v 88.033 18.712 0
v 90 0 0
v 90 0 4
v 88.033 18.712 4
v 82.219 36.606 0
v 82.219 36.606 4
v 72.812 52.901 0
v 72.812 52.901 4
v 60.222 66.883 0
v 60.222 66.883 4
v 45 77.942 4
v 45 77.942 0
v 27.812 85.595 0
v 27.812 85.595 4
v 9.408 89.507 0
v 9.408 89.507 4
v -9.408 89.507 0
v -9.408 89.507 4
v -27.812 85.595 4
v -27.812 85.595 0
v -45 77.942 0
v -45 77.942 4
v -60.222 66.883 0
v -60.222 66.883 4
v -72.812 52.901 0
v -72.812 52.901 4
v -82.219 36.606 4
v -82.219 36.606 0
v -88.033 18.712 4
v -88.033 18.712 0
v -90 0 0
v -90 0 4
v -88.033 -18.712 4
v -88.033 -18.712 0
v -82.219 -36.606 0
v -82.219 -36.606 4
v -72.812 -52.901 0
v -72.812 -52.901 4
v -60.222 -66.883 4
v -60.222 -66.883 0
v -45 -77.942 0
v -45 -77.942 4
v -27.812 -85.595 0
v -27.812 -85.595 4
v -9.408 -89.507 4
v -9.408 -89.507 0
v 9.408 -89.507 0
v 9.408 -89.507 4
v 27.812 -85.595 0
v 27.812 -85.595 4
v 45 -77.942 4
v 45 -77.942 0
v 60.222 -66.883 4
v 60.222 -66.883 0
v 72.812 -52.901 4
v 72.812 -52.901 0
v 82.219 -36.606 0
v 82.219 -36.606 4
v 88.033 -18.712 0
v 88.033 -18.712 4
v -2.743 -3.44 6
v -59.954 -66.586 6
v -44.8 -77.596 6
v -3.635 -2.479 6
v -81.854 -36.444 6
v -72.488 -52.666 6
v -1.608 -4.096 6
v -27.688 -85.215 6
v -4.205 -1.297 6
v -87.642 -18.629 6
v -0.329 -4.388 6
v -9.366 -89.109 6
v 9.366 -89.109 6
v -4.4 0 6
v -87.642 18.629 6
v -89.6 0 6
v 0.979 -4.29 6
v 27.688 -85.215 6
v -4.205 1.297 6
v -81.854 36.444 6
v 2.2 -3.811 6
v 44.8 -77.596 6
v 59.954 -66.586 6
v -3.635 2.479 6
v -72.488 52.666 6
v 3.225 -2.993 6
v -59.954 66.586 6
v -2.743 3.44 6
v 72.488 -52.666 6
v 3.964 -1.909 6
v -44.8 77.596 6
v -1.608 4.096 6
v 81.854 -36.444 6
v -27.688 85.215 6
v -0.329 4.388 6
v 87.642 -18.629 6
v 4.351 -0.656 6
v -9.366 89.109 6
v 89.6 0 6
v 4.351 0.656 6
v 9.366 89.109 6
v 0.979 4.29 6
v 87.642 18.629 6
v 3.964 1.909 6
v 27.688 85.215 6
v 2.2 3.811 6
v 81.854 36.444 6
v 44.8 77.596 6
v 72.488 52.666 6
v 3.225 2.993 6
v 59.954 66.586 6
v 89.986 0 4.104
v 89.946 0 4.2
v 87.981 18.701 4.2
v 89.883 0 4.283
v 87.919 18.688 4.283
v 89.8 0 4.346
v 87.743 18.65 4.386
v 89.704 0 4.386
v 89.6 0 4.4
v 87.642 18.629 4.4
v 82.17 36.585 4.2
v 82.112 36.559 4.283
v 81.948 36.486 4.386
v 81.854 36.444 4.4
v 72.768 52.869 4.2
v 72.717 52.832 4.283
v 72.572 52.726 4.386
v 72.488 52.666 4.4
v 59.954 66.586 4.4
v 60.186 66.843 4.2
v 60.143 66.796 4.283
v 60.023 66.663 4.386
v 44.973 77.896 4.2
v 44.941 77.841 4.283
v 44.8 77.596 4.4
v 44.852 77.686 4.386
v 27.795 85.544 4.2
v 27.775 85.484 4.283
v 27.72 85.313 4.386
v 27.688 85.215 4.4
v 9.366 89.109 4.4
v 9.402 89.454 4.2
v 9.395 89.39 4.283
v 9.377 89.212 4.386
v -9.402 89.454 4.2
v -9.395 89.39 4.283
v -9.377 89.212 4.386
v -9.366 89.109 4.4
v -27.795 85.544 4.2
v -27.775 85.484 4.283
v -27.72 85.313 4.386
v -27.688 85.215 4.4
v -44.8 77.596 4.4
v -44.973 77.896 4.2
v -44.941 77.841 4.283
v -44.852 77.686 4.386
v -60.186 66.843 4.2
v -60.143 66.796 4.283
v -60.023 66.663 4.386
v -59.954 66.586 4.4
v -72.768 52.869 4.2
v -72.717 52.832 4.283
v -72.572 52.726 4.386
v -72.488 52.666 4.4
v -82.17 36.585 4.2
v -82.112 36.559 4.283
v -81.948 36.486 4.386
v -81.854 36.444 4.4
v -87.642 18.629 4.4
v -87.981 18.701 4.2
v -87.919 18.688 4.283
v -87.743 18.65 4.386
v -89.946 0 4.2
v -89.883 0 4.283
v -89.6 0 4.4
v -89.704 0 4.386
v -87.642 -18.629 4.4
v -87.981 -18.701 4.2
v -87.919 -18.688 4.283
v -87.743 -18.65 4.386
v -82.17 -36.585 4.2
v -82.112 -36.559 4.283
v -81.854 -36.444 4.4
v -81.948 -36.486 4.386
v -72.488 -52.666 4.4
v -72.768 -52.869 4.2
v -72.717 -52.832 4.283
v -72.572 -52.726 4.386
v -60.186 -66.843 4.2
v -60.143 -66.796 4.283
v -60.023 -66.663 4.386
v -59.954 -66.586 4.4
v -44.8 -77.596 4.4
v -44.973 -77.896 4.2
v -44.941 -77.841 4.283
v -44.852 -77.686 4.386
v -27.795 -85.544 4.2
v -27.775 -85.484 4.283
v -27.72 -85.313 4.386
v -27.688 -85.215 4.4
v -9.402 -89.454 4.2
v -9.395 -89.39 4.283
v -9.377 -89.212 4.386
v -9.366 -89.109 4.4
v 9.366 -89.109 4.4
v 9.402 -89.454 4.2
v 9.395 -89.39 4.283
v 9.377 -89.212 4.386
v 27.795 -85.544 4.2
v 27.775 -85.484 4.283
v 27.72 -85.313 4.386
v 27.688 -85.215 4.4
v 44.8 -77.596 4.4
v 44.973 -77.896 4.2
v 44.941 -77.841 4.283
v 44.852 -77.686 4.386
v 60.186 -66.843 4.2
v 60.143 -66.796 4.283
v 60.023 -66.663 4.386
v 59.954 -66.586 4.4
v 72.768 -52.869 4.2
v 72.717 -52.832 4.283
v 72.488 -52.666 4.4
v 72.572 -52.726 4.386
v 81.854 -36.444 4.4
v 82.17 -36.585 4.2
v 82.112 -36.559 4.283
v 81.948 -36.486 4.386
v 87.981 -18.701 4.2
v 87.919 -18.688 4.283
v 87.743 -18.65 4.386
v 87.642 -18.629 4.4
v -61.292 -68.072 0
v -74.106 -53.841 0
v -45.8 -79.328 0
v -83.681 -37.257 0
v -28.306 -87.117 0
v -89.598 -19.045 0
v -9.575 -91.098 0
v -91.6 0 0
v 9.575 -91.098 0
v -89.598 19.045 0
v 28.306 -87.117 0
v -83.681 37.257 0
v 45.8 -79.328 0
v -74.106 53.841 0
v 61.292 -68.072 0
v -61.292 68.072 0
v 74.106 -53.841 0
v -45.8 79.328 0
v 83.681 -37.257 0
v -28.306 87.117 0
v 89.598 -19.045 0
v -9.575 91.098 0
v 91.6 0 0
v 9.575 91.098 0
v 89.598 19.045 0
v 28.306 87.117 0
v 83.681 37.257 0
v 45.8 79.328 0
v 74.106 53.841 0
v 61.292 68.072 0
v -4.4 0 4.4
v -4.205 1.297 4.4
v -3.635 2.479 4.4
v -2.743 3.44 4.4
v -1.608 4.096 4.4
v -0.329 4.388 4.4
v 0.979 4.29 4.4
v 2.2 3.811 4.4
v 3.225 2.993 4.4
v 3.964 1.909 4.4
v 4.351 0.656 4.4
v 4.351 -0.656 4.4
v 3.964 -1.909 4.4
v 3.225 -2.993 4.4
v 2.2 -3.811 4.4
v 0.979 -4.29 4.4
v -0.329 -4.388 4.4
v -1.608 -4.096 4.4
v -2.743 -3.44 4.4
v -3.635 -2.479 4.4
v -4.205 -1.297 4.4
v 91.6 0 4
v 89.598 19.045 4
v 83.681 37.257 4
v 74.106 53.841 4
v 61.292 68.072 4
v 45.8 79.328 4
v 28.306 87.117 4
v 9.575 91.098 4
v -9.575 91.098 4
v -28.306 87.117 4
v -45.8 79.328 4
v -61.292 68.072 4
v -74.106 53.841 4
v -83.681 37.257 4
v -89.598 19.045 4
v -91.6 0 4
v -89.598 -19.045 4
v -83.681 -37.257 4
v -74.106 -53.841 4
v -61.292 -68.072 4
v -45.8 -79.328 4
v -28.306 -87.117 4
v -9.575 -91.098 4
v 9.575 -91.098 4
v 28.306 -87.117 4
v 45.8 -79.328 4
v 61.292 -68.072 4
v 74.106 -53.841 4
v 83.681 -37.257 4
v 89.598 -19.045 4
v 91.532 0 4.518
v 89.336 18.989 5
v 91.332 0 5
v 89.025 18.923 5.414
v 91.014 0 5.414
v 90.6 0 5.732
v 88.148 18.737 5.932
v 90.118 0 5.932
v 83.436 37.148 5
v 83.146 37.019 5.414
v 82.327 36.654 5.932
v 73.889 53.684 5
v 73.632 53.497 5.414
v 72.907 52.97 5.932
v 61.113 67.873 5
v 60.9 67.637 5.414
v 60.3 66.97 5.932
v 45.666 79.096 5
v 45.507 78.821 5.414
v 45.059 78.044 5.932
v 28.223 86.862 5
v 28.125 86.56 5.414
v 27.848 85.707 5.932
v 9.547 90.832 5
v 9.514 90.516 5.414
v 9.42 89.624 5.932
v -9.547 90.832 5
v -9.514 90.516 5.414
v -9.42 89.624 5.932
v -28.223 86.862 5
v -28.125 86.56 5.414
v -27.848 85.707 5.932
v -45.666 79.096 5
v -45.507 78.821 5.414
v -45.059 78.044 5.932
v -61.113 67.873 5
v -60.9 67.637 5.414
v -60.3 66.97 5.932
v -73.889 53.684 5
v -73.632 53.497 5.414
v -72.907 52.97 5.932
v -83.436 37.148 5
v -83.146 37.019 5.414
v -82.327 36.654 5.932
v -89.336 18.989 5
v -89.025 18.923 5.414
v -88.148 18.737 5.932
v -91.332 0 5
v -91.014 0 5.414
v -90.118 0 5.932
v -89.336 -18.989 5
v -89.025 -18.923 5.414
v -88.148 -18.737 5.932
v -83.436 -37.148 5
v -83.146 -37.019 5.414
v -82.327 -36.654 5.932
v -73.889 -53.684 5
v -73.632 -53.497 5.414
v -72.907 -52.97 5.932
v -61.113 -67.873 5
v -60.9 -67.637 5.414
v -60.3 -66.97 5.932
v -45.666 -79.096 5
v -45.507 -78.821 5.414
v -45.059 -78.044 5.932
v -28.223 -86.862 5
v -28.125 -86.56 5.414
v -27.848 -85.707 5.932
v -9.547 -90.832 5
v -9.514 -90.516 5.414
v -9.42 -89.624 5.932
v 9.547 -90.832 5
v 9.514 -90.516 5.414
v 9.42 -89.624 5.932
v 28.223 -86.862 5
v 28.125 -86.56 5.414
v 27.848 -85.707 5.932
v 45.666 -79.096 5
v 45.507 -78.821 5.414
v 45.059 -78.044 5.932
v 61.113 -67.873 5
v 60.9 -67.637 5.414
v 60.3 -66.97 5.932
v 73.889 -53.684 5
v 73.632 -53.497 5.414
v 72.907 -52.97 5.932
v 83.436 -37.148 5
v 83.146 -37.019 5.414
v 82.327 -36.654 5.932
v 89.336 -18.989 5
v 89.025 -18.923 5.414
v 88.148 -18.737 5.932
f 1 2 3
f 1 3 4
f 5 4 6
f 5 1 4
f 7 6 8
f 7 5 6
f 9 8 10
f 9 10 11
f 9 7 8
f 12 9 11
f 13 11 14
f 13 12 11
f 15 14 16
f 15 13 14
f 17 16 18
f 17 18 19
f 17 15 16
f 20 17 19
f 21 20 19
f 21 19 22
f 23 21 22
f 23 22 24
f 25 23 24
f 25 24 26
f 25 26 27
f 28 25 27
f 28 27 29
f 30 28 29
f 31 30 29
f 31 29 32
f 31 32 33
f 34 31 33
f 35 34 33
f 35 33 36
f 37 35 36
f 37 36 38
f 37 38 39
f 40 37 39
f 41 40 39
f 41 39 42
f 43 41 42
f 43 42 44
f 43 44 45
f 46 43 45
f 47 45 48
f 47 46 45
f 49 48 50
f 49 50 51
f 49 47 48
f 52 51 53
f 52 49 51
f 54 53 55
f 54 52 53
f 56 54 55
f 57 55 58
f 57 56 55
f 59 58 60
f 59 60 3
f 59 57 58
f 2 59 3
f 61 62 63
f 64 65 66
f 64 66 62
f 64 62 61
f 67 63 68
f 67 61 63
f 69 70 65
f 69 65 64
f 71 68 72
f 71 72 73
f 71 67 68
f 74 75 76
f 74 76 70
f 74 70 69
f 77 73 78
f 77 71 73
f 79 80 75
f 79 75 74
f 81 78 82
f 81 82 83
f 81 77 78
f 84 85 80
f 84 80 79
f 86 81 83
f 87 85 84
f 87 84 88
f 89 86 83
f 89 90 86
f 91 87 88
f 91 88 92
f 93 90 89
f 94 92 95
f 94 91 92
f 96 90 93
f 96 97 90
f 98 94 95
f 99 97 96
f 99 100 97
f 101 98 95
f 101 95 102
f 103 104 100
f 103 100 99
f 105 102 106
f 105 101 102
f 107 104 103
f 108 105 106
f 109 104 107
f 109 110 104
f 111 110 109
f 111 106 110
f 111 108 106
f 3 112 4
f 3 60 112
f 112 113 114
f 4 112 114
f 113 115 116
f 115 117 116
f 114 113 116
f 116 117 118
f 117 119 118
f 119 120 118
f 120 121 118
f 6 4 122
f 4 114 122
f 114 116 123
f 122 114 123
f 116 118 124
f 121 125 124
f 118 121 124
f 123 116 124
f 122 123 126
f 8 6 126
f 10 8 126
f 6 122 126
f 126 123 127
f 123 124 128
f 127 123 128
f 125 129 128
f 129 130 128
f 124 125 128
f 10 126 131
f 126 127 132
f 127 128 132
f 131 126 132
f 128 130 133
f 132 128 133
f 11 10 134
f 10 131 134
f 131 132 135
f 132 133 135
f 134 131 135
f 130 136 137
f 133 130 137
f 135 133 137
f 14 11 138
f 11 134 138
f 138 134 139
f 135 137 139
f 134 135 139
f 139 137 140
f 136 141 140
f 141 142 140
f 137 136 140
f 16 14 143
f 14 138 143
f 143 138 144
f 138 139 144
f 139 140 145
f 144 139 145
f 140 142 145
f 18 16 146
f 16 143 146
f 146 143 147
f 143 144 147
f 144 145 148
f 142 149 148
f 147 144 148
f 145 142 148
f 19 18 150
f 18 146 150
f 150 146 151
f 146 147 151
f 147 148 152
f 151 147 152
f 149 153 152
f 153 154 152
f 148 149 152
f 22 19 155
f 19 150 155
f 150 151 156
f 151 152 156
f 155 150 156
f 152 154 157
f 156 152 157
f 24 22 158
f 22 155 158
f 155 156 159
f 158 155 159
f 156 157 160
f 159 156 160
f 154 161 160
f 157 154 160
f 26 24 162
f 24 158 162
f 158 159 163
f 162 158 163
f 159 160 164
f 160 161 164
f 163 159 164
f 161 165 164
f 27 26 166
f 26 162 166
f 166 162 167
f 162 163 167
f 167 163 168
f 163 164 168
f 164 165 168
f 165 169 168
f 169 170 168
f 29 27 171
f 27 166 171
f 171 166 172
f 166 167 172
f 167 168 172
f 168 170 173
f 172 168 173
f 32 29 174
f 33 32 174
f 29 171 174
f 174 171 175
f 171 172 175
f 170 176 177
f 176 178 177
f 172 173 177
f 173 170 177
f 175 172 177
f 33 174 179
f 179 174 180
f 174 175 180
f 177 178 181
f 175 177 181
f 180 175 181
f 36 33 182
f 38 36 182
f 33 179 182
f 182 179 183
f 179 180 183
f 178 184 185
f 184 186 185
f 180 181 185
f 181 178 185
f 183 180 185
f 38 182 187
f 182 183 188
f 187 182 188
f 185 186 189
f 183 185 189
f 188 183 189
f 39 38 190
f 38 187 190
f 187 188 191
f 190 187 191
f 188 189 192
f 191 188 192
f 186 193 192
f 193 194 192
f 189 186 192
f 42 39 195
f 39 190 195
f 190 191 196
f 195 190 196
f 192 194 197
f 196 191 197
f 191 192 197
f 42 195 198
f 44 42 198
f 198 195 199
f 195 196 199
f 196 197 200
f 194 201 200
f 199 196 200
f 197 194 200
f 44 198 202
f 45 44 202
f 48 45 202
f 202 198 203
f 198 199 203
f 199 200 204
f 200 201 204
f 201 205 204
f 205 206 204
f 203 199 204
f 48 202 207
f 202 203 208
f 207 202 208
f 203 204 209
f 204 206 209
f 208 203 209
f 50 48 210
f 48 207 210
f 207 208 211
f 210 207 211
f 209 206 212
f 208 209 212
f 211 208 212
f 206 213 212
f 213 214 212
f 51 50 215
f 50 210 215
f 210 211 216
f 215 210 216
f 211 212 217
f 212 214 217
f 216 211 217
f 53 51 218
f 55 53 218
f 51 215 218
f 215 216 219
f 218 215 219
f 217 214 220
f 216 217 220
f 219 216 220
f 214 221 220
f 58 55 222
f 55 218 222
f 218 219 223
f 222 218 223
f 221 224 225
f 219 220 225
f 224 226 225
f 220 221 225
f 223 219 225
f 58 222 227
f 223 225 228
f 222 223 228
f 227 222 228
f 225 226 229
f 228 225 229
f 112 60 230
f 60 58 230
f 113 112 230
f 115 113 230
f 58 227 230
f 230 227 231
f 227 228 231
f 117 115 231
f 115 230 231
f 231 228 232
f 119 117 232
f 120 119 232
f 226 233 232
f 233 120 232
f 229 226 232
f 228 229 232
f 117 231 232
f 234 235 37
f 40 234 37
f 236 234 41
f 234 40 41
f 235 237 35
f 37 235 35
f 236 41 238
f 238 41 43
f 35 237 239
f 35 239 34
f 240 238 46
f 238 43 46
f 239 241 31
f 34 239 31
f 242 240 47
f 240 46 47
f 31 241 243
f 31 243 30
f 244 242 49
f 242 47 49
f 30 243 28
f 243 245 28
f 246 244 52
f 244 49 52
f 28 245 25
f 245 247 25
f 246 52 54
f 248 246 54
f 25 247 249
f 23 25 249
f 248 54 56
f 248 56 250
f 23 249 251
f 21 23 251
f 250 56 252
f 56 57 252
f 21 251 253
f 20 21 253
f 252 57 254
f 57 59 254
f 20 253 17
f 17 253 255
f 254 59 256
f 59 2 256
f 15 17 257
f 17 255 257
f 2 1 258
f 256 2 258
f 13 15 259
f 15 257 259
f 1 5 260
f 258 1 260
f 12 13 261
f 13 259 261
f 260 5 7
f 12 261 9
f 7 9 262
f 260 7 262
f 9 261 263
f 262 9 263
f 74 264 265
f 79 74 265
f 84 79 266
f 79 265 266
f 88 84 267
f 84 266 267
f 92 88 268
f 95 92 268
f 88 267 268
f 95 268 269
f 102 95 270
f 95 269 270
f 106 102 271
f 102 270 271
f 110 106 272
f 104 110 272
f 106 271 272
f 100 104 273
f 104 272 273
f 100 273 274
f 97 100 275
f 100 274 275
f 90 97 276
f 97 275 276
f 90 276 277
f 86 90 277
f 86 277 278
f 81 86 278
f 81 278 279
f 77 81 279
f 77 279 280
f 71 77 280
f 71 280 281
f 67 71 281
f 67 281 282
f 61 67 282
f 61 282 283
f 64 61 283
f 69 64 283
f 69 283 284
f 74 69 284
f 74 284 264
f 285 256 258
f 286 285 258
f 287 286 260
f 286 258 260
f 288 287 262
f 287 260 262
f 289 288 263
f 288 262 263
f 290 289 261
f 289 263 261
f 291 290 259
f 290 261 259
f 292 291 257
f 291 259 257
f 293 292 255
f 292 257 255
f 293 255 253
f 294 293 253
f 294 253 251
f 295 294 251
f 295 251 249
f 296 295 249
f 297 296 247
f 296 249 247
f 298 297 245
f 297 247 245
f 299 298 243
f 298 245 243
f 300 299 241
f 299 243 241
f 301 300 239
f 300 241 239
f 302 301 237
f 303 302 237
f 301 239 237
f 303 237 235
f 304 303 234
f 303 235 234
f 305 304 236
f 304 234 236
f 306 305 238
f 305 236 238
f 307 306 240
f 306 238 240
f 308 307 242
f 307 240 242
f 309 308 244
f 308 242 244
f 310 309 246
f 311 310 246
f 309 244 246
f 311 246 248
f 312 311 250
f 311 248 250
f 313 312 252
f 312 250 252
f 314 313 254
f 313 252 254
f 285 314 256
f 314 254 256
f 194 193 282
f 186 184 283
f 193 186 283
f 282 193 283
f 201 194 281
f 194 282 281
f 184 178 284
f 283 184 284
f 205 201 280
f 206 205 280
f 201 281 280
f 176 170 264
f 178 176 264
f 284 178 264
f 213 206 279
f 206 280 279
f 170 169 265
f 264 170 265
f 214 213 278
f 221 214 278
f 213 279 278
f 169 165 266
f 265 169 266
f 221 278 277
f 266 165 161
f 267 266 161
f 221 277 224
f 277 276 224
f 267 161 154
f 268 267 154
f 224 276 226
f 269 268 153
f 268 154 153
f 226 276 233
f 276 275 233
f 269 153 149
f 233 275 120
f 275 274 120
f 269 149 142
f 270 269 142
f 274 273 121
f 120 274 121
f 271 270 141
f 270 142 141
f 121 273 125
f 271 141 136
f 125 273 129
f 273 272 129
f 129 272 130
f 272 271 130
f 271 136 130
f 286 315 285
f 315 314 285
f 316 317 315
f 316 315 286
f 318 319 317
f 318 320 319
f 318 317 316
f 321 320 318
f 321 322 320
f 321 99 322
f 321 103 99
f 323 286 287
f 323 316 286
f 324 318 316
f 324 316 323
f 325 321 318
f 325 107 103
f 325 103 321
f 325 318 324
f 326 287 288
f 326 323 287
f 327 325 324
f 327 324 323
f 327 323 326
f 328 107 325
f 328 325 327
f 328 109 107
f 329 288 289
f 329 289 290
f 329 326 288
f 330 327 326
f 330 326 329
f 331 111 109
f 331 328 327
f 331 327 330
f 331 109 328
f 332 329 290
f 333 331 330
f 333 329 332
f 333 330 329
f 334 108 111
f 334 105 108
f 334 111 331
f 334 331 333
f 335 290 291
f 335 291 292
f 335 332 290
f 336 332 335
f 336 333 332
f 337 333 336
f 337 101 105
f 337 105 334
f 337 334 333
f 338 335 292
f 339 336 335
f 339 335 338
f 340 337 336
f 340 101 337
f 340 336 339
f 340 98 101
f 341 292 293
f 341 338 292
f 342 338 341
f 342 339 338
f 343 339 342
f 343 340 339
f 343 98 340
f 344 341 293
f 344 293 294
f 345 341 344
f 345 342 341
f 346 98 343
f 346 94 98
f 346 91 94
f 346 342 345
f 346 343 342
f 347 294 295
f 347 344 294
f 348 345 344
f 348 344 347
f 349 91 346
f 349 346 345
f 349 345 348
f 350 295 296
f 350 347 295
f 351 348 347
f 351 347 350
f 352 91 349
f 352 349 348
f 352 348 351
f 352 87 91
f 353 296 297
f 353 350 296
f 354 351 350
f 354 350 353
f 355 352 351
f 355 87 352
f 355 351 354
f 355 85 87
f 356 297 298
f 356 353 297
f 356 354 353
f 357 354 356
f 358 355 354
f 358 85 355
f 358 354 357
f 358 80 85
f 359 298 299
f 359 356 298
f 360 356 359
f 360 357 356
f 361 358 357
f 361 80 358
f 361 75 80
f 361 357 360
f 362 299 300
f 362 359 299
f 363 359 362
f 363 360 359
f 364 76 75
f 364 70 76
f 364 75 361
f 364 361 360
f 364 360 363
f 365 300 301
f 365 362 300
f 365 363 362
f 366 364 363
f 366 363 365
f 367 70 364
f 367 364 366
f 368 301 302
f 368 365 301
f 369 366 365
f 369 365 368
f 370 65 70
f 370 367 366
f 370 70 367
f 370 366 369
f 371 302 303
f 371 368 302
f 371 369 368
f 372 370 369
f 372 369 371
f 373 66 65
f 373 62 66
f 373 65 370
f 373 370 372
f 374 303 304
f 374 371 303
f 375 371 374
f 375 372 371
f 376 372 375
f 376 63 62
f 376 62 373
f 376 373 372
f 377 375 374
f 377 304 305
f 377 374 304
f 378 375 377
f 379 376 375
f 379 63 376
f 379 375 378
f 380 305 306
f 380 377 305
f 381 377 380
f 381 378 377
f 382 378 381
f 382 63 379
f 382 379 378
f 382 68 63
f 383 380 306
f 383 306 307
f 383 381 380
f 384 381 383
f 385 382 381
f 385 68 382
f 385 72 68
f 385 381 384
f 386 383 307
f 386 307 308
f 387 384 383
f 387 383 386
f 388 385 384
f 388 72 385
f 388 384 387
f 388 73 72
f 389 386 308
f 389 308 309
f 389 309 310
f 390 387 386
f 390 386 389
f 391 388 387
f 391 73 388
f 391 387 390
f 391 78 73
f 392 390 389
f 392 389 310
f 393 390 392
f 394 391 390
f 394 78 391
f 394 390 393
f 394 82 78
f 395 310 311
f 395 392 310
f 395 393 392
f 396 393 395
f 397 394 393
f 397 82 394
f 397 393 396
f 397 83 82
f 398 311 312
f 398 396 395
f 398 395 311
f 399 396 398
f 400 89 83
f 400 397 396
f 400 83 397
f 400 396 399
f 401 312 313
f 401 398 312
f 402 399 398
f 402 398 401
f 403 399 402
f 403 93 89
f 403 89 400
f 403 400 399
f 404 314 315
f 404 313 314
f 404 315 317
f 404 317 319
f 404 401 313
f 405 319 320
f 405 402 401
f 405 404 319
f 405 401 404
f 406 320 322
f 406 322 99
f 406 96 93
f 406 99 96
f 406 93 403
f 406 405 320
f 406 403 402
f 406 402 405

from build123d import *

# Parameters (mm, degrees)
F0_R     = 91.6
F1_DEPTH = 6
F2_R     = 2
F3_T     = -1.6
F6_R     = 30
F7_DEPTH = 50
F8_R     = 26.5
F9_DEPTH = 56.001
F12_D    = 8.8


with BuildPart() as f1:
    # F0 (on Top) → F1 (new body)
    with BuildSketch(Plane.XY):
        Circle(F0_R)
    extrude(amount=F1_DEPTH)

    # F2
    f2_edges = [f1.edges().sort_by_distance(p)[0] for p in [
        (-91.6, 0, 6),
    ]]
    fillet(f2_edges, radius=F2_R)

    # F3
    f3_openings = [f1.faces().sort_by_distance(p)[0] for p in [
        (0, 0, 0),
    ]]
    offset(amount=F3_T, openings=f3_openings)


with BuildPart() as f5_1:
    # F5: copy of F1
    add(f1.part)


with BuildPart() as f7:
    # F6 (on face) → F7 (new body)
    with BuildSketch(Plane.XY.offset(6)):
        Circle(F6_R)
    extrude(amount=F7_DEPTH)

    # F8 (on face) → F9 (cut, through all)
    with BuildSketch(Plane.XY.offset(56)):
        Circle(F8_R)
    extrude(amount=-F9_DEPTH, mode=Mode.SUBTRACT)


with BuildPart() as f1_1:
    add(f1.part)

    # F12 (through all)
    with Locations(Plane.XY.offset(6)):
        with Locations((0, 0)):
            Hole(F12_D / 2)


solid = f1_1.part
